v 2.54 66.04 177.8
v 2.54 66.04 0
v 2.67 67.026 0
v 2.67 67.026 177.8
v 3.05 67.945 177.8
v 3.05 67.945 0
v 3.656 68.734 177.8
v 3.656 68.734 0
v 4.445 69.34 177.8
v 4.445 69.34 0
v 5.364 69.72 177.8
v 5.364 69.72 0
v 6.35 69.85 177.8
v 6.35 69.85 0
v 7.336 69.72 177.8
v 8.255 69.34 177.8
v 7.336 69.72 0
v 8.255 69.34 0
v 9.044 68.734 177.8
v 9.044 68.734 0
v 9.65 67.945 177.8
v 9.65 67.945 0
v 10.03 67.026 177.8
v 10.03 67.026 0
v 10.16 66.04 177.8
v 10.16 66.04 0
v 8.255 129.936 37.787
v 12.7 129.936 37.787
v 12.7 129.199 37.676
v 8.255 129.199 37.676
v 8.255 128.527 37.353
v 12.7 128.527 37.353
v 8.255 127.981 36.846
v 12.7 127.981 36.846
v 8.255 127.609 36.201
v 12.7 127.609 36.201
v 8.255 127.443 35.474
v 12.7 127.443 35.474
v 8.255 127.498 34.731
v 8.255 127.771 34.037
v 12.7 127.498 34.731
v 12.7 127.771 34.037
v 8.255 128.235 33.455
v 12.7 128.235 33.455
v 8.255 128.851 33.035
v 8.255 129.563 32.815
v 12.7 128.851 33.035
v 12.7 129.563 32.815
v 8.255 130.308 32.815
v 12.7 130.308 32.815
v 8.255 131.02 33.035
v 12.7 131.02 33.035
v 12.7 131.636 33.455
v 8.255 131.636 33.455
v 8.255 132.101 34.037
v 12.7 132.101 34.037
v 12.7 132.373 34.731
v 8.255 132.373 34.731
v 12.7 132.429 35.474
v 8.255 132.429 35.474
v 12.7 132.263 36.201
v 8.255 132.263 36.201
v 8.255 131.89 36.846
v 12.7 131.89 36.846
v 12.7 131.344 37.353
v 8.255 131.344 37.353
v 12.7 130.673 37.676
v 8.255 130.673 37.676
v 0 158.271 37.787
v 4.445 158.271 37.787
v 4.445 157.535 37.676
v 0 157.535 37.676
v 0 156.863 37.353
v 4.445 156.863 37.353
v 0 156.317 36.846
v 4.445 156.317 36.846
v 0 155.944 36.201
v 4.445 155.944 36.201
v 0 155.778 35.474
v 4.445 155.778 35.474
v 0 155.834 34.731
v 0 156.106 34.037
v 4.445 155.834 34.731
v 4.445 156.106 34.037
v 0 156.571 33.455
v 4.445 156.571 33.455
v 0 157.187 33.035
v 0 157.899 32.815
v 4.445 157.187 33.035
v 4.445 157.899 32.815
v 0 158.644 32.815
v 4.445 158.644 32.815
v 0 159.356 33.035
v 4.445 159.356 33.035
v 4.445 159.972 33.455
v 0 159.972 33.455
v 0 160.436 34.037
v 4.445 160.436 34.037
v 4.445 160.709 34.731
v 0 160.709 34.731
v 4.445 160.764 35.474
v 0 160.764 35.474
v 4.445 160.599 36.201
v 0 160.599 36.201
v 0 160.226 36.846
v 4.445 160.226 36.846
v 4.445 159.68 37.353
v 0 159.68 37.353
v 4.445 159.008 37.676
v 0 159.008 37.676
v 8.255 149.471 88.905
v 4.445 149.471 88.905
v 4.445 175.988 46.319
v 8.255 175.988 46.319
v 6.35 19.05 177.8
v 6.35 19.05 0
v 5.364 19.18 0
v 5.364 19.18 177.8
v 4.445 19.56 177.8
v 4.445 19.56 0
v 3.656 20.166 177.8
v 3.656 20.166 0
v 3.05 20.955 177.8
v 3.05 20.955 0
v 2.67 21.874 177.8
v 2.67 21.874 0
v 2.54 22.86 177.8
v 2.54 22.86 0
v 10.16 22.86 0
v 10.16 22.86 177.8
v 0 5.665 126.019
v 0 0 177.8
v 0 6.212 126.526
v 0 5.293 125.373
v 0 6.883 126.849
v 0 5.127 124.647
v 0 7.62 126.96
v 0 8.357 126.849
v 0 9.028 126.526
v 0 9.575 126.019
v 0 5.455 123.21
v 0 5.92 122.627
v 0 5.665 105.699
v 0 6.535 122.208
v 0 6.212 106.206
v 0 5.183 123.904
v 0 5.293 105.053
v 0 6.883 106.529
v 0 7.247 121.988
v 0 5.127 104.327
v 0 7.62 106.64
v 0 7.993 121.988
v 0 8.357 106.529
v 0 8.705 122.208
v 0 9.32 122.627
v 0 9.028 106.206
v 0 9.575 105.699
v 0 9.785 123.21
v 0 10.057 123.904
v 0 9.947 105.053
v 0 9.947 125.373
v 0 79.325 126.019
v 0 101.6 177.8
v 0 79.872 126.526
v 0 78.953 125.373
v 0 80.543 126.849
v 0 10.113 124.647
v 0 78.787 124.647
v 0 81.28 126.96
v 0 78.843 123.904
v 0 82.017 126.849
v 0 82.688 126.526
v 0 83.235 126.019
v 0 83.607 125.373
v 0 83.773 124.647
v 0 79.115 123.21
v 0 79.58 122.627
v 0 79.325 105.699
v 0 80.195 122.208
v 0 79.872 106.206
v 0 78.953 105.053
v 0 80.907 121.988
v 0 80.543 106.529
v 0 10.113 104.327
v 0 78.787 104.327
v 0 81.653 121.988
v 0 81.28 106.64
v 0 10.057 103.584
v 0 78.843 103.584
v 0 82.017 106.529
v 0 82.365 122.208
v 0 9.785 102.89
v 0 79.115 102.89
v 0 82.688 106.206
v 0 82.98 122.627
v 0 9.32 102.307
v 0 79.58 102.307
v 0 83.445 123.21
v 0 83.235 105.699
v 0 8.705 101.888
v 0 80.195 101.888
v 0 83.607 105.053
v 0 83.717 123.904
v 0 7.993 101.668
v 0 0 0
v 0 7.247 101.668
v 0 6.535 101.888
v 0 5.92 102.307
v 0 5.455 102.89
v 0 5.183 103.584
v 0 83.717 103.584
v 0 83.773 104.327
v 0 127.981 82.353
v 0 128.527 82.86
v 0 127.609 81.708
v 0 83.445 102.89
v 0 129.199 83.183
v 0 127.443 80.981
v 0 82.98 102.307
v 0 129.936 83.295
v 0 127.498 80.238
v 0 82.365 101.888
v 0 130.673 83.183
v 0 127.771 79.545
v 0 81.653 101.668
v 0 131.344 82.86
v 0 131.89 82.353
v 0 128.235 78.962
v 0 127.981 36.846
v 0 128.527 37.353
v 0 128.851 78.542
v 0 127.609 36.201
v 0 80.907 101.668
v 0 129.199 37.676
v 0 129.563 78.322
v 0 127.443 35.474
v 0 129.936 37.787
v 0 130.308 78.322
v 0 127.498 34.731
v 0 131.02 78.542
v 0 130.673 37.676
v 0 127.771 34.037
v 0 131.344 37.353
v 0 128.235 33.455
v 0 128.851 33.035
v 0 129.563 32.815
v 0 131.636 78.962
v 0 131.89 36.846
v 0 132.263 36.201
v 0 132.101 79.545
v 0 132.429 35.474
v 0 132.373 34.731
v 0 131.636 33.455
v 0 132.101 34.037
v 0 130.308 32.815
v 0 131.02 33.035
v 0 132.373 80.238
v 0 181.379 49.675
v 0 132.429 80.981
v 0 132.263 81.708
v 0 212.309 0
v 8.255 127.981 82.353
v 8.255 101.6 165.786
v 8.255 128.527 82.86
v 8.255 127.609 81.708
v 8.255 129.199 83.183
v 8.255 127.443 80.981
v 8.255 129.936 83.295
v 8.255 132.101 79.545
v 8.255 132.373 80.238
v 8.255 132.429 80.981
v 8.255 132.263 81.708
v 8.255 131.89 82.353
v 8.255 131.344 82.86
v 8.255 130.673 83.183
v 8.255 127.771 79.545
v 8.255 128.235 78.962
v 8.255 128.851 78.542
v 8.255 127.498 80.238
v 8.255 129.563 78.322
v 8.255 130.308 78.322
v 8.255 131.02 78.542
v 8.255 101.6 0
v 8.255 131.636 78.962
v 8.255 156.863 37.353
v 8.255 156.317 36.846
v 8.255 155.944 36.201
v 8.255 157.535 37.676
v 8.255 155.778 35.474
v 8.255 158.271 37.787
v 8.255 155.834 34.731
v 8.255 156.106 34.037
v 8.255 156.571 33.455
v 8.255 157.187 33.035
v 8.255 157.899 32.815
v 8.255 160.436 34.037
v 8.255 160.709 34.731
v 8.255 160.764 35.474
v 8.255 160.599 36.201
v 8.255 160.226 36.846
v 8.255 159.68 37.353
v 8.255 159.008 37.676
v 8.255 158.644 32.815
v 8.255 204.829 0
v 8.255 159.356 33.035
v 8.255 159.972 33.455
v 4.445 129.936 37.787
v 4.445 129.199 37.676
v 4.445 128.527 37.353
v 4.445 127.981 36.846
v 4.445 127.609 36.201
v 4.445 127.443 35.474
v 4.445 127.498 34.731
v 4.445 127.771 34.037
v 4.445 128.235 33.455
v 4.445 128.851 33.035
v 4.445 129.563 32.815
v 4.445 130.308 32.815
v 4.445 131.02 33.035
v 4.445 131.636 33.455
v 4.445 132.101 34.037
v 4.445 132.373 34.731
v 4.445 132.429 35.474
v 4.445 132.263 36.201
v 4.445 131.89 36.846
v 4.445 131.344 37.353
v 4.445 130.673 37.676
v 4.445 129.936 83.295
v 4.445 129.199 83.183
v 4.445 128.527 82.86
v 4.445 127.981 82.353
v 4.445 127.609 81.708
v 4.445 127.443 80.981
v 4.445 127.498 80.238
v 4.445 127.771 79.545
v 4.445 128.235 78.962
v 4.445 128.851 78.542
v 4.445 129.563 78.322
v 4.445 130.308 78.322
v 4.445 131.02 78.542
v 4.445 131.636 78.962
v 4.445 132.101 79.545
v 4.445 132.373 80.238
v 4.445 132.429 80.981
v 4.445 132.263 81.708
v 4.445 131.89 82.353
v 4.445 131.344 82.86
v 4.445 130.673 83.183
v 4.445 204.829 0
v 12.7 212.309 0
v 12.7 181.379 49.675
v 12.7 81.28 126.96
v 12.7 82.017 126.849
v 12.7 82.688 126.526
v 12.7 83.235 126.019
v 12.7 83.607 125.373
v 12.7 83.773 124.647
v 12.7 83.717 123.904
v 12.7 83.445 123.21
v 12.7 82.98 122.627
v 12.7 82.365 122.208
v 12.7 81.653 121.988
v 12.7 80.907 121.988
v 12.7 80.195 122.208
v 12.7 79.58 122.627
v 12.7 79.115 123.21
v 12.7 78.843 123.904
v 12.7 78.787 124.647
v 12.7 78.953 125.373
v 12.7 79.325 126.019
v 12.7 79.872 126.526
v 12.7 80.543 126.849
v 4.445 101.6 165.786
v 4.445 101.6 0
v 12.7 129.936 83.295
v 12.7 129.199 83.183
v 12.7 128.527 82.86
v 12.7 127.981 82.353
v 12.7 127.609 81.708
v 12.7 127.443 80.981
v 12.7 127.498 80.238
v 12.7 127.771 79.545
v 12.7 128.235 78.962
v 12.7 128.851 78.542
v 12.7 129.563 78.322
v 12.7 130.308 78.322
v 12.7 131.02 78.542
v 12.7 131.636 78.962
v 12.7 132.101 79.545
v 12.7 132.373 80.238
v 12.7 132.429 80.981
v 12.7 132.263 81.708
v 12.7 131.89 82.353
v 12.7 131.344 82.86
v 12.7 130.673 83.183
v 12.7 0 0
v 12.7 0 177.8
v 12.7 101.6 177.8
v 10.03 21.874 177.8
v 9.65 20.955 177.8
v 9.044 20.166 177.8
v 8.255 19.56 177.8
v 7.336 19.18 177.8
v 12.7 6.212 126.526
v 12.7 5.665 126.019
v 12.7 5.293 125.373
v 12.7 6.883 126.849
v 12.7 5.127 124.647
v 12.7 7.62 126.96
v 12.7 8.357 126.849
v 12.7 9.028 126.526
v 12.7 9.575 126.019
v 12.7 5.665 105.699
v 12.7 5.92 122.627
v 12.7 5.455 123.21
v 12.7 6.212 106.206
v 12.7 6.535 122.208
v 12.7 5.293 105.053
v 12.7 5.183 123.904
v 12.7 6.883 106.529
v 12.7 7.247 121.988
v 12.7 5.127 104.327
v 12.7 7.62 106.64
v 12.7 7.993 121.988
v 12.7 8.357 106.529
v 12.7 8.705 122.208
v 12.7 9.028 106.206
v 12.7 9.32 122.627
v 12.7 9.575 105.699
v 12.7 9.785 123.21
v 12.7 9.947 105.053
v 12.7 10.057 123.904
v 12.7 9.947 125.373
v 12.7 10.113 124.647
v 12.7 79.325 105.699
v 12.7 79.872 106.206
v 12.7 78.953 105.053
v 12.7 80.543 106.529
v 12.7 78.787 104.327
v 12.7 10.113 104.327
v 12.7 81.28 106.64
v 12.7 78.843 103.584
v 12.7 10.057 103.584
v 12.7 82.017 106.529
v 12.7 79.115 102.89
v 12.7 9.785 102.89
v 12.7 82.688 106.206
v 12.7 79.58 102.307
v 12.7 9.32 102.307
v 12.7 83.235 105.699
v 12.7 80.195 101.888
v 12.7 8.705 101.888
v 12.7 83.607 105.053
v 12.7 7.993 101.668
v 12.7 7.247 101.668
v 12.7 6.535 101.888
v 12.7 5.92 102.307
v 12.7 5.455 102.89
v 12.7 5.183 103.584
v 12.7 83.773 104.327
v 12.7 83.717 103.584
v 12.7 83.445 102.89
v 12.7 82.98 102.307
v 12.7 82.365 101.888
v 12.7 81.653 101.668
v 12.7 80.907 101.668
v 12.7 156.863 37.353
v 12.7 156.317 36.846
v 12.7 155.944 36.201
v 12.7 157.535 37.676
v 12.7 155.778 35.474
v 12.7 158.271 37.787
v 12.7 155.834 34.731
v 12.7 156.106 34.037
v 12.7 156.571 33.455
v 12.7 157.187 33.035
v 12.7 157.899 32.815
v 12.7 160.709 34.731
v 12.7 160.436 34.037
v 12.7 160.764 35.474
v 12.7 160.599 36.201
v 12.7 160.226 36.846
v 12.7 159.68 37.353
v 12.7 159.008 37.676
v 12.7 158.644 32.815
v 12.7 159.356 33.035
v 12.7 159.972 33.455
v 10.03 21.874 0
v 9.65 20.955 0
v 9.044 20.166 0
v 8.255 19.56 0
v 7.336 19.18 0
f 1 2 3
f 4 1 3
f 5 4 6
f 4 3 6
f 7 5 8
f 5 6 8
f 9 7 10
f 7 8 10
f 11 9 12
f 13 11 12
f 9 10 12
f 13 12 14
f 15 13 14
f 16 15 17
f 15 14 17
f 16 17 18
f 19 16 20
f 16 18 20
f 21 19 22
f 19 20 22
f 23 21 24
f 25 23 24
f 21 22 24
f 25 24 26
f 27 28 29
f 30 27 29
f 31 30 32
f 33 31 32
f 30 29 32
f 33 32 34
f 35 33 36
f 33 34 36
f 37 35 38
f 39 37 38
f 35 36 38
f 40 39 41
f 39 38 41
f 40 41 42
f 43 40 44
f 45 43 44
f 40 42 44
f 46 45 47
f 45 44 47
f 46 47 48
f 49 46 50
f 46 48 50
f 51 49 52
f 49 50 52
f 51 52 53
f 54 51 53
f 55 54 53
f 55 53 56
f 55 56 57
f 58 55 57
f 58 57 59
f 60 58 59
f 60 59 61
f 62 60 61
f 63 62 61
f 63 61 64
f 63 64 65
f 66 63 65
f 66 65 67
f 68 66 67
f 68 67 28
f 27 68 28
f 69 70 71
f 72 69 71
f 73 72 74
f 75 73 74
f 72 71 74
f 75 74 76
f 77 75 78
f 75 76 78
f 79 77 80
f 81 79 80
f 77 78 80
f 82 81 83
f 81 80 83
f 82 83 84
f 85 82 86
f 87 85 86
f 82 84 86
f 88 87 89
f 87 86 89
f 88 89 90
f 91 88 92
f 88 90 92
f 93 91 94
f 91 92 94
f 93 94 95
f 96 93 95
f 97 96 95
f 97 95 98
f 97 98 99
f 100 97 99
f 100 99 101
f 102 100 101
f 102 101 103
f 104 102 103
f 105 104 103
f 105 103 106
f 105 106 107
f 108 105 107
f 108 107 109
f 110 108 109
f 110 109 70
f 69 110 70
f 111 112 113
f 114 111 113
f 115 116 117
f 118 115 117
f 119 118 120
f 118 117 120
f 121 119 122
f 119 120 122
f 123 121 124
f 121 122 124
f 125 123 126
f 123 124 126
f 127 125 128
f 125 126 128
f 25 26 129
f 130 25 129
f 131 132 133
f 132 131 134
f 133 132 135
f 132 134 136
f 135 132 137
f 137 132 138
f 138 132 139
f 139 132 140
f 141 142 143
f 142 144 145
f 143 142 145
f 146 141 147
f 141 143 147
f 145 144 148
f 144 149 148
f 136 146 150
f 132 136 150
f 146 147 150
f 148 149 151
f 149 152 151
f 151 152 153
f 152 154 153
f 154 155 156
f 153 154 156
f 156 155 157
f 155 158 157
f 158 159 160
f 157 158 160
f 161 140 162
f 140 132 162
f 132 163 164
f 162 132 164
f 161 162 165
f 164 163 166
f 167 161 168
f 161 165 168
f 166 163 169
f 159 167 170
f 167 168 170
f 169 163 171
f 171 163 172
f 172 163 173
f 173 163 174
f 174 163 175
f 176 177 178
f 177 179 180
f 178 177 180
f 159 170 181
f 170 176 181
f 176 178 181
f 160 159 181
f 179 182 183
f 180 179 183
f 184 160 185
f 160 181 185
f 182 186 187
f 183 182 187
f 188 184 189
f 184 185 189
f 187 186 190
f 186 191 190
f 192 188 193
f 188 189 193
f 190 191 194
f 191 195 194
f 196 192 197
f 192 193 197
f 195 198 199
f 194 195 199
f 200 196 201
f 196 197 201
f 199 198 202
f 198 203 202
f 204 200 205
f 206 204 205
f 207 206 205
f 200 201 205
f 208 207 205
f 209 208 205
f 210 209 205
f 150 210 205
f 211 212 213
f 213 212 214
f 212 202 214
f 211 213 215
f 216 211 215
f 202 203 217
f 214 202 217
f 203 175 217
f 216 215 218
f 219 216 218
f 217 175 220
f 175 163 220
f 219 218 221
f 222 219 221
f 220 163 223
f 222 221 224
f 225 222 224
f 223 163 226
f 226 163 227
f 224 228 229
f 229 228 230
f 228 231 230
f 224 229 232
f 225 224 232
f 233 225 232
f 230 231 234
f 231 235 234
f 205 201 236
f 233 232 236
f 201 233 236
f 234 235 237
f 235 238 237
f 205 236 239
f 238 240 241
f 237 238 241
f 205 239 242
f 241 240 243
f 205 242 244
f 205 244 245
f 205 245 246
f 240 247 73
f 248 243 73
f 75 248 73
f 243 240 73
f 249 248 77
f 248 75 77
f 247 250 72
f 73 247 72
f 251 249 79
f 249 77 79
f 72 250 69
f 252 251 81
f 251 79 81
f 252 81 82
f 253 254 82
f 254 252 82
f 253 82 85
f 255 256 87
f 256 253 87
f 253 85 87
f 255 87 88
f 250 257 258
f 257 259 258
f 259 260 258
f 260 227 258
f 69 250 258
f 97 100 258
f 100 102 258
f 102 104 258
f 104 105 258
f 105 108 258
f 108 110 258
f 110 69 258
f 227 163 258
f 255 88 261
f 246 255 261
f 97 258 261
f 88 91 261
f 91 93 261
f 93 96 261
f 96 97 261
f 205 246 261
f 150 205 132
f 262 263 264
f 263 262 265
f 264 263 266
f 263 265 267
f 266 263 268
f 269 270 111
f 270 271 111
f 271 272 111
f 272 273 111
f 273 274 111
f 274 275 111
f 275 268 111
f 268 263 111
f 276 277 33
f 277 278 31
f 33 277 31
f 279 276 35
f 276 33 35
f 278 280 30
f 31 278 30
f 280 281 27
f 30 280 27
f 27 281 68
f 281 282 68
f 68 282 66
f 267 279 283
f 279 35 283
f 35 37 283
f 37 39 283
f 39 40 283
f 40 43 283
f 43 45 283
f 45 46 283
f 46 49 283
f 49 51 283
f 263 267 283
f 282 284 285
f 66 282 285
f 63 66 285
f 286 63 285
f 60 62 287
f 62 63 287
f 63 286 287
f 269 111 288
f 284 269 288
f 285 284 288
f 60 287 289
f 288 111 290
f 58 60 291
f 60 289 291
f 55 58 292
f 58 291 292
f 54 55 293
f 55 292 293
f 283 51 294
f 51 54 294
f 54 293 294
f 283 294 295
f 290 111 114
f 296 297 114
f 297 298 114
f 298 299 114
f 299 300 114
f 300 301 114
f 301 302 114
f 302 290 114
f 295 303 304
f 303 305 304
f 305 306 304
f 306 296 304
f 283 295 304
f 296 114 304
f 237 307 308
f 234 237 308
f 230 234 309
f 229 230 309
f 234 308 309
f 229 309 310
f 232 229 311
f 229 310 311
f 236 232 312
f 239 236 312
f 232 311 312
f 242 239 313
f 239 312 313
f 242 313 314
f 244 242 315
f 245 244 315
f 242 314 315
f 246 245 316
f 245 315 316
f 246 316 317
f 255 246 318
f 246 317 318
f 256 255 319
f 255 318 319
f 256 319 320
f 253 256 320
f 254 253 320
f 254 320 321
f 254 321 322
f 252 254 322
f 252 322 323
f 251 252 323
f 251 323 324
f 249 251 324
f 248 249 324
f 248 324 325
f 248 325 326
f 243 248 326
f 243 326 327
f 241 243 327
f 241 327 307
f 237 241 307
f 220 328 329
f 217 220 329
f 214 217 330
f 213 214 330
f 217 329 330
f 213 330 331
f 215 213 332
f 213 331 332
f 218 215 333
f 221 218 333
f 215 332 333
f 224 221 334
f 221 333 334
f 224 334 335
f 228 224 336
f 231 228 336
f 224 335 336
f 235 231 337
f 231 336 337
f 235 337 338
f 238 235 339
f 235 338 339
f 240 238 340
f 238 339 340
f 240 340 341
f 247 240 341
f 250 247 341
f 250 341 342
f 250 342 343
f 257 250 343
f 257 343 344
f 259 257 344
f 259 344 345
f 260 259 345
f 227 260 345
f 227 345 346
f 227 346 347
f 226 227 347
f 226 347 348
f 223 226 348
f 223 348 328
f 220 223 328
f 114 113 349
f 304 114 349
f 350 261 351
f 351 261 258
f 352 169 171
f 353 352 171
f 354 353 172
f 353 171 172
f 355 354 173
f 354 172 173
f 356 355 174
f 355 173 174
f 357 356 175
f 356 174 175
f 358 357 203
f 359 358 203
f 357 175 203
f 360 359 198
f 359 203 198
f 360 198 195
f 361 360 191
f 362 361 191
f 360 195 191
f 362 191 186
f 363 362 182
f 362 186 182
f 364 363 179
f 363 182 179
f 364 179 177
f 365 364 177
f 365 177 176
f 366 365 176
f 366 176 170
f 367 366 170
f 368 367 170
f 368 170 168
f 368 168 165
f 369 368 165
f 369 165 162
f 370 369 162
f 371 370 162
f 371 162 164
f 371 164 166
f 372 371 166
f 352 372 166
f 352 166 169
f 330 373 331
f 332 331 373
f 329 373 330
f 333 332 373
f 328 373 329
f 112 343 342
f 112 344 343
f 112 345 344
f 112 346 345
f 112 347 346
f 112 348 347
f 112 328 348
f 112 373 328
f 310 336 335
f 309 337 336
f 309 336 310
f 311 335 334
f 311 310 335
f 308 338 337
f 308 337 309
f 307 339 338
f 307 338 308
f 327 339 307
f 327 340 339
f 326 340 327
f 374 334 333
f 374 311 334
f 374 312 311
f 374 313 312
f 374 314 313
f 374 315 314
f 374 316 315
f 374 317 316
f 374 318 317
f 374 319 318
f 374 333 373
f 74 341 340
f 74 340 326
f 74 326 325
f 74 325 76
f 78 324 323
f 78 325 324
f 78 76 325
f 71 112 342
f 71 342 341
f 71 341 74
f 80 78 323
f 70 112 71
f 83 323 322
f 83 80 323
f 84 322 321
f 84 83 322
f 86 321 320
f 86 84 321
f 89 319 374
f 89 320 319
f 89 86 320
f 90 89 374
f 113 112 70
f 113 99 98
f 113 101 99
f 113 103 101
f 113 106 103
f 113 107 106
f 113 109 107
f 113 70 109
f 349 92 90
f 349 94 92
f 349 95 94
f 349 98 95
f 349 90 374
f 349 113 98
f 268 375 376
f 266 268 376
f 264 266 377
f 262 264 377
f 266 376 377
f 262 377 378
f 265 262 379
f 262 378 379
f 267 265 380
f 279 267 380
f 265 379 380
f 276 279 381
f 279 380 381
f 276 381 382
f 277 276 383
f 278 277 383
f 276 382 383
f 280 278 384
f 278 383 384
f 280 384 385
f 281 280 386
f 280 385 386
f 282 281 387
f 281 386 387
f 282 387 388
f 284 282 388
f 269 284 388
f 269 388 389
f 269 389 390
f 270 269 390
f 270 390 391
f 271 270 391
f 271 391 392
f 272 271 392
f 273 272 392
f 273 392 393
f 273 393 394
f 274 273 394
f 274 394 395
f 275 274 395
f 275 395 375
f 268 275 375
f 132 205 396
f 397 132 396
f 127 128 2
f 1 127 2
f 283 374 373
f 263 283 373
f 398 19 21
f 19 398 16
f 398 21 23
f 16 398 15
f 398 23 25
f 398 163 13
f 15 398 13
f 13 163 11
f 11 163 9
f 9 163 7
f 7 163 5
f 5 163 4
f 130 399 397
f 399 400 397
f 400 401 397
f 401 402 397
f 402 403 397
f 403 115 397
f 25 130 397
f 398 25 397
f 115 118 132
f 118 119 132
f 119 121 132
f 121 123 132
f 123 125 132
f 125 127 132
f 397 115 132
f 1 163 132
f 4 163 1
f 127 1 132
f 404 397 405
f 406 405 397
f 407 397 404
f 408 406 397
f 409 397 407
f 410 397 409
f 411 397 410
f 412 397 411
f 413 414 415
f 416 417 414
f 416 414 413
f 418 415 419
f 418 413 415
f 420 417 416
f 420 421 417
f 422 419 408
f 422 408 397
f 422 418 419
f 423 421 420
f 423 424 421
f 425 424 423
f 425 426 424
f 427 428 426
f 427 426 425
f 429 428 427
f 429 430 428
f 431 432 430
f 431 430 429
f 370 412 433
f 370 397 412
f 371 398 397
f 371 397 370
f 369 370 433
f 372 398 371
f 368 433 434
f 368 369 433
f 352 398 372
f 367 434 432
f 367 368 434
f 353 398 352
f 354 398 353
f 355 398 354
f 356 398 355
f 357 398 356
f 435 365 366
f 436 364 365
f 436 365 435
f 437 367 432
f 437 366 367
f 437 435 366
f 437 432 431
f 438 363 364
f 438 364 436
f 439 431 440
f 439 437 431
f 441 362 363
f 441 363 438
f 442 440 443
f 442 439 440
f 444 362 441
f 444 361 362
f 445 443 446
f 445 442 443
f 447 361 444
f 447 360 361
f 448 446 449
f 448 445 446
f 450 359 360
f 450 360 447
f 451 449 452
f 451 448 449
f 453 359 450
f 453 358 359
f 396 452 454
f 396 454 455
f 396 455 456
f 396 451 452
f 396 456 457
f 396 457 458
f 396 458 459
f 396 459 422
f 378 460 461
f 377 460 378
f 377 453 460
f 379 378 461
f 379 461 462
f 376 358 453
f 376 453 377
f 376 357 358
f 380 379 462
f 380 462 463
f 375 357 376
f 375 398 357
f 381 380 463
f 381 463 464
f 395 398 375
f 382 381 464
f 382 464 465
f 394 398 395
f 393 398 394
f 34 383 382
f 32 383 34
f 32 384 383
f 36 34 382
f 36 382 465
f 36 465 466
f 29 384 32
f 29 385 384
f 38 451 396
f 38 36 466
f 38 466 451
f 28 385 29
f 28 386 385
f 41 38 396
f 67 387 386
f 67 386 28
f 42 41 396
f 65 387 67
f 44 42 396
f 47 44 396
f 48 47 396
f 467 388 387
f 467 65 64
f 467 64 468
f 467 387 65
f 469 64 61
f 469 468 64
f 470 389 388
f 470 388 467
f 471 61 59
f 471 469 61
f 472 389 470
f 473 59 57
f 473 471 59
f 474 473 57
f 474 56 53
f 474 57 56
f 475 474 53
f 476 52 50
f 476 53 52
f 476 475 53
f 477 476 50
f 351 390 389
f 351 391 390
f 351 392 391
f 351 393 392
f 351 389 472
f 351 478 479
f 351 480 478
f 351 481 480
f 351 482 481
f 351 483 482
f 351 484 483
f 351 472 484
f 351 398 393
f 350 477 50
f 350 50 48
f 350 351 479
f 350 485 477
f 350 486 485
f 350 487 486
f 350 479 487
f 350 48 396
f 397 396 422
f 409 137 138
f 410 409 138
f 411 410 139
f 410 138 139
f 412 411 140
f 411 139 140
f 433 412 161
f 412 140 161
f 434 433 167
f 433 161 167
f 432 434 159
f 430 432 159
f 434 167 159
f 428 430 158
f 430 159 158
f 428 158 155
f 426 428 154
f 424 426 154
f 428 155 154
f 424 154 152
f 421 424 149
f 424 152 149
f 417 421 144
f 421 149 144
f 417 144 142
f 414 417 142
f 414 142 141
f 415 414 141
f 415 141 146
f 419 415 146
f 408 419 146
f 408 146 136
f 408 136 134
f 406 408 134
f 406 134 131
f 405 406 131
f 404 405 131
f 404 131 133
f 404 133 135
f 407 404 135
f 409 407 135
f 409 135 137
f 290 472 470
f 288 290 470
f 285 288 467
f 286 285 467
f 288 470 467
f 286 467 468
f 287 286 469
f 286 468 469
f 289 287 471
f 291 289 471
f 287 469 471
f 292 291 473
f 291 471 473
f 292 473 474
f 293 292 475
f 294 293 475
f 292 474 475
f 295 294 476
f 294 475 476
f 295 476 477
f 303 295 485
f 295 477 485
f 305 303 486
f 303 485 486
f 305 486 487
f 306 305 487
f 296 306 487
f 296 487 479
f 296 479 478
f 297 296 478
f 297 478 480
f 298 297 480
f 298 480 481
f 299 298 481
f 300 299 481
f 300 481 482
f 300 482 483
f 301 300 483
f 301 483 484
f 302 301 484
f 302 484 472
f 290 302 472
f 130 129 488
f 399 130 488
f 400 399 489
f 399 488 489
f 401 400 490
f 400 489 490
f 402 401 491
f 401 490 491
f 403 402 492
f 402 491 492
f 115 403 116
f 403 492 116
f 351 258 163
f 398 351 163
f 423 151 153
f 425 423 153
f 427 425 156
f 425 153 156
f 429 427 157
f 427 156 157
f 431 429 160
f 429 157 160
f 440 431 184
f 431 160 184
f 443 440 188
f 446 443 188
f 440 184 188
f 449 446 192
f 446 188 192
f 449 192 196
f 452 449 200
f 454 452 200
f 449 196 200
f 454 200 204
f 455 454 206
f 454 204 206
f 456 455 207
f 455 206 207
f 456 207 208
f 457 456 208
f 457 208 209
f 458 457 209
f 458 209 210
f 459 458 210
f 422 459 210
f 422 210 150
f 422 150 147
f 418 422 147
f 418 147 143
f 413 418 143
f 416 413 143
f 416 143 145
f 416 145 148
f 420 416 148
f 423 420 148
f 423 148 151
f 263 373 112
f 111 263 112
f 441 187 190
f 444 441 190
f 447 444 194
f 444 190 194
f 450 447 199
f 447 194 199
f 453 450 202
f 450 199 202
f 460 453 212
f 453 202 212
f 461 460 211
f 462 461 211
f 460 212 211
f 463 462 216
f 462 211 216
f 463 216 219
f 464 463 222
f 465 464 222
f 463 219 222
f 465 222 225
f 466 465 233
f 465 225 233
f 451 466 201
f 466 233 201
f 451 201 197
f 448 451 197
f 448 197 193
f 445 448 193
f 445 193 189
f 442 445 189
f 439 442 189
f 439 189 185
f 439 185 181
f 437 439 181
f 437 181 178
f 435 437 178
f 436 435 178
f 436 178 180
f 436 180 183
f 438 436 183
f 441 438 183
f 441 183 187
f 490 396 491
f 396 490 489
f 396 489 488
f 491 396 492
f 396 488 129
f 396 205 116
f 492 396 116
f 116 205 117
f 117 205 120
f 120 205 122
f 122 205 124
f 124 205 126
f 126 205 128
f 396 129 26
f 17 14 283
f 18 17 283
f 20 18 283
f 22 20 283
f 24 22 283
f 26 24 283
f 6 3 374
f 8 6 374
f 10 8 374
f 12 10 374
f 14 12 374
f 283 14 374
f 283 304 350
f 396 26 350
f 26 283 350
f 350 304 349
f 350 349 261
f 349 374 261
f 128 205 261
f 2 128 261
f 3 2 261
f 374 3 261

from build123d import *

# Parameters (mm, degrees)
BOSS_EXTRUDE1_DEPTH   = 177.8
BOSS_EXTRUDE2_DEPTH   = 12.7
BOSS_EXTRUDE4_DEPTH   = 4.445
BOSS_EXTRUDE5_DEPTH   = 4.445
M6X1_0_TAPPED_HOLE1_D = 5
M6X1_0_TAPPED_HOLE2_D = 5


with BuildPart() as part:
    # Sketch1 → Boss-Extrude1 (new body)
    with BuildSketch(Plane.XY):
        with BuildLine():
            Line((0, 88.9), (0, 44.45))
            Line((0, 44.45), (2.54, 44.45))
            Line((2.54, 44.45), (2.54, 66.04))
            ThreePointArc((2.54, 66.04), (3.655923164, 68.734076836), (6.35, 69.85))
            ThreePointArc((6.35, 69.85), (9.044076836, 68.734076836), (10.16, 66.04))
            Line((10.16, 66.04), (10.16, 44.45))
            Line((10.16, 44.45), (12.7, 44.45))
            Line((12.7, 44.45), (12.7, 88.9))
            Line((12.7, 88.9), (0, 88.9))
        make_face()
        with BuildLine():
            Line((0, 44.45), (0, 0))
            Line((0, 0), (12.7, 0))
            Line((12.7, 0), (12.7, 44.45))
            Line((12.7, 44.45), (10.16, 44.45))
            Line((10.16, 44.45), (10.16, 22.86))
            ThreePointArc((10.16, 22.86), (9.044076836, 20.165923164), (6.35, 19.05))
            ThreePointArc((6.35, 19.05), (3.655923164, 20.165923164), (2.54, 22.86))
            Line((2.54, 22.86), (2.54, 44.45))
            Line((2.54, 44.45), (0, 44.45))
        make_face()
    extrude(amount=BOSS_EXTRUDE1_DEPTH)

    # Sketch5 → Boss-Extrude2 (add)
    with BuildSketch(Plane(origin=(0, 0, 0), x_dir=(0, 0, -1), z_dir=(1, 0, 0))):
        Polygon((-177.8, 101.6), (-177.8, 88.9), (0, 88.9), (0, 101.6), (-12.013513514, 101.6), (-165.786486486, 101.6), align=None)
        Polygon((-49.675142857, 181.378572199), (-177.8, 101.6), (-165.786486486, 101.6), (-88.904700233, 149.471422238), (-46.318714286, 175.988128132), align=None)
        Polygon((0, 212.309431825), (-49.675142857, 181.378572199), (-46.318714286, 175.988128132), (0, 204.82906481), align=None)
    extrude(amount=BOSS_EXTRUDE2_DEPTH)

    # Sketch6 → Boss-Extrude4 (add)
    with BuildSketch(Plane(origin=(12.7, 0, 0), x_dir=(0, 0, -1), z_dir=(1, 0, 0))):
        Polygon((-88.904700233, 149.471422238), (-165.786486486, 101.6), (-12.013513514, 101.6), (-3.356428571, 106.990444068), (-46.318714286, 175.988128132), align=None)
        Polygon((0, 204.82906481), (-46.318714286, 175.988128132), (-3.356428571, 106.990444068), (0, 109.080367015), align=None)
        Polygon((-12.013513514, 101.6), (0, 101.6), (-3.356428571, 106.990444068), align=None)
        Polygon((-3.356428571, 106.990444068), (0, 101.6), (0, 109.080367015), align=None)
    extrude(amount=-BOSS_EXTRUDE4_DEPTH)

    # Sketch5<6> → Boss-Extrude5 (add)
    with BuildSketch(Plane(origin=(0, 0, 0), x_dir=(0, 0, -1), z_dir=(1, 0, 0))):
        Polygon((-88.904700233, 149.471422238), (-165.786486486, 101.6), (-12.013513514, 101.6), (-3.356428571, 106.990444068), (-46.318714286, 175.988128132), align=None)
        Polygon((0, 204.82906481), (-46.318714286, 175.988128132), (-3.356428571, 106.990444068), (0, 109.080367015), align=None)
        Polygon((-12.013513514, 101.6), (0, 101.6), (-3.356428571, 106.990444068), align=None)
        Polygon((-3.356428571, 106.990444068), (0, 101.6), (0, 109.080367015), align=None)
    extrude(amount=BOSS_EXTRUDE5_DEPTH)

    # M6x1.0 Tapped Hole1 (through all)
    with Locations(Plane(origin=(12.7, 0, 0), x_dir=(0, 0, -1), z_dir=(1, 0, 0))):
        with Locations((-124.46, 7.62), (-104.14, 81.28), (-124.46, 81.28), (-104.14, 7.62)):
            Hole(M6X1_0_TAPPED_HOLE1_D / 2)

    # M6x1.0 Tapped Hole2 (through all)
    with Locations(Plane(origin=(0, 0, 0), x_dir=(0, 0, -1), z_dir=(-1, 0, 0))):
        with Locations((-35.287182484, -129.93571152), (-80.794502188, -129.93571152), (-35.287182484, -158.271423041)):
            Hole(M6X1_0_TAPPED_HOLE2_D / 2)


solid = part.part
